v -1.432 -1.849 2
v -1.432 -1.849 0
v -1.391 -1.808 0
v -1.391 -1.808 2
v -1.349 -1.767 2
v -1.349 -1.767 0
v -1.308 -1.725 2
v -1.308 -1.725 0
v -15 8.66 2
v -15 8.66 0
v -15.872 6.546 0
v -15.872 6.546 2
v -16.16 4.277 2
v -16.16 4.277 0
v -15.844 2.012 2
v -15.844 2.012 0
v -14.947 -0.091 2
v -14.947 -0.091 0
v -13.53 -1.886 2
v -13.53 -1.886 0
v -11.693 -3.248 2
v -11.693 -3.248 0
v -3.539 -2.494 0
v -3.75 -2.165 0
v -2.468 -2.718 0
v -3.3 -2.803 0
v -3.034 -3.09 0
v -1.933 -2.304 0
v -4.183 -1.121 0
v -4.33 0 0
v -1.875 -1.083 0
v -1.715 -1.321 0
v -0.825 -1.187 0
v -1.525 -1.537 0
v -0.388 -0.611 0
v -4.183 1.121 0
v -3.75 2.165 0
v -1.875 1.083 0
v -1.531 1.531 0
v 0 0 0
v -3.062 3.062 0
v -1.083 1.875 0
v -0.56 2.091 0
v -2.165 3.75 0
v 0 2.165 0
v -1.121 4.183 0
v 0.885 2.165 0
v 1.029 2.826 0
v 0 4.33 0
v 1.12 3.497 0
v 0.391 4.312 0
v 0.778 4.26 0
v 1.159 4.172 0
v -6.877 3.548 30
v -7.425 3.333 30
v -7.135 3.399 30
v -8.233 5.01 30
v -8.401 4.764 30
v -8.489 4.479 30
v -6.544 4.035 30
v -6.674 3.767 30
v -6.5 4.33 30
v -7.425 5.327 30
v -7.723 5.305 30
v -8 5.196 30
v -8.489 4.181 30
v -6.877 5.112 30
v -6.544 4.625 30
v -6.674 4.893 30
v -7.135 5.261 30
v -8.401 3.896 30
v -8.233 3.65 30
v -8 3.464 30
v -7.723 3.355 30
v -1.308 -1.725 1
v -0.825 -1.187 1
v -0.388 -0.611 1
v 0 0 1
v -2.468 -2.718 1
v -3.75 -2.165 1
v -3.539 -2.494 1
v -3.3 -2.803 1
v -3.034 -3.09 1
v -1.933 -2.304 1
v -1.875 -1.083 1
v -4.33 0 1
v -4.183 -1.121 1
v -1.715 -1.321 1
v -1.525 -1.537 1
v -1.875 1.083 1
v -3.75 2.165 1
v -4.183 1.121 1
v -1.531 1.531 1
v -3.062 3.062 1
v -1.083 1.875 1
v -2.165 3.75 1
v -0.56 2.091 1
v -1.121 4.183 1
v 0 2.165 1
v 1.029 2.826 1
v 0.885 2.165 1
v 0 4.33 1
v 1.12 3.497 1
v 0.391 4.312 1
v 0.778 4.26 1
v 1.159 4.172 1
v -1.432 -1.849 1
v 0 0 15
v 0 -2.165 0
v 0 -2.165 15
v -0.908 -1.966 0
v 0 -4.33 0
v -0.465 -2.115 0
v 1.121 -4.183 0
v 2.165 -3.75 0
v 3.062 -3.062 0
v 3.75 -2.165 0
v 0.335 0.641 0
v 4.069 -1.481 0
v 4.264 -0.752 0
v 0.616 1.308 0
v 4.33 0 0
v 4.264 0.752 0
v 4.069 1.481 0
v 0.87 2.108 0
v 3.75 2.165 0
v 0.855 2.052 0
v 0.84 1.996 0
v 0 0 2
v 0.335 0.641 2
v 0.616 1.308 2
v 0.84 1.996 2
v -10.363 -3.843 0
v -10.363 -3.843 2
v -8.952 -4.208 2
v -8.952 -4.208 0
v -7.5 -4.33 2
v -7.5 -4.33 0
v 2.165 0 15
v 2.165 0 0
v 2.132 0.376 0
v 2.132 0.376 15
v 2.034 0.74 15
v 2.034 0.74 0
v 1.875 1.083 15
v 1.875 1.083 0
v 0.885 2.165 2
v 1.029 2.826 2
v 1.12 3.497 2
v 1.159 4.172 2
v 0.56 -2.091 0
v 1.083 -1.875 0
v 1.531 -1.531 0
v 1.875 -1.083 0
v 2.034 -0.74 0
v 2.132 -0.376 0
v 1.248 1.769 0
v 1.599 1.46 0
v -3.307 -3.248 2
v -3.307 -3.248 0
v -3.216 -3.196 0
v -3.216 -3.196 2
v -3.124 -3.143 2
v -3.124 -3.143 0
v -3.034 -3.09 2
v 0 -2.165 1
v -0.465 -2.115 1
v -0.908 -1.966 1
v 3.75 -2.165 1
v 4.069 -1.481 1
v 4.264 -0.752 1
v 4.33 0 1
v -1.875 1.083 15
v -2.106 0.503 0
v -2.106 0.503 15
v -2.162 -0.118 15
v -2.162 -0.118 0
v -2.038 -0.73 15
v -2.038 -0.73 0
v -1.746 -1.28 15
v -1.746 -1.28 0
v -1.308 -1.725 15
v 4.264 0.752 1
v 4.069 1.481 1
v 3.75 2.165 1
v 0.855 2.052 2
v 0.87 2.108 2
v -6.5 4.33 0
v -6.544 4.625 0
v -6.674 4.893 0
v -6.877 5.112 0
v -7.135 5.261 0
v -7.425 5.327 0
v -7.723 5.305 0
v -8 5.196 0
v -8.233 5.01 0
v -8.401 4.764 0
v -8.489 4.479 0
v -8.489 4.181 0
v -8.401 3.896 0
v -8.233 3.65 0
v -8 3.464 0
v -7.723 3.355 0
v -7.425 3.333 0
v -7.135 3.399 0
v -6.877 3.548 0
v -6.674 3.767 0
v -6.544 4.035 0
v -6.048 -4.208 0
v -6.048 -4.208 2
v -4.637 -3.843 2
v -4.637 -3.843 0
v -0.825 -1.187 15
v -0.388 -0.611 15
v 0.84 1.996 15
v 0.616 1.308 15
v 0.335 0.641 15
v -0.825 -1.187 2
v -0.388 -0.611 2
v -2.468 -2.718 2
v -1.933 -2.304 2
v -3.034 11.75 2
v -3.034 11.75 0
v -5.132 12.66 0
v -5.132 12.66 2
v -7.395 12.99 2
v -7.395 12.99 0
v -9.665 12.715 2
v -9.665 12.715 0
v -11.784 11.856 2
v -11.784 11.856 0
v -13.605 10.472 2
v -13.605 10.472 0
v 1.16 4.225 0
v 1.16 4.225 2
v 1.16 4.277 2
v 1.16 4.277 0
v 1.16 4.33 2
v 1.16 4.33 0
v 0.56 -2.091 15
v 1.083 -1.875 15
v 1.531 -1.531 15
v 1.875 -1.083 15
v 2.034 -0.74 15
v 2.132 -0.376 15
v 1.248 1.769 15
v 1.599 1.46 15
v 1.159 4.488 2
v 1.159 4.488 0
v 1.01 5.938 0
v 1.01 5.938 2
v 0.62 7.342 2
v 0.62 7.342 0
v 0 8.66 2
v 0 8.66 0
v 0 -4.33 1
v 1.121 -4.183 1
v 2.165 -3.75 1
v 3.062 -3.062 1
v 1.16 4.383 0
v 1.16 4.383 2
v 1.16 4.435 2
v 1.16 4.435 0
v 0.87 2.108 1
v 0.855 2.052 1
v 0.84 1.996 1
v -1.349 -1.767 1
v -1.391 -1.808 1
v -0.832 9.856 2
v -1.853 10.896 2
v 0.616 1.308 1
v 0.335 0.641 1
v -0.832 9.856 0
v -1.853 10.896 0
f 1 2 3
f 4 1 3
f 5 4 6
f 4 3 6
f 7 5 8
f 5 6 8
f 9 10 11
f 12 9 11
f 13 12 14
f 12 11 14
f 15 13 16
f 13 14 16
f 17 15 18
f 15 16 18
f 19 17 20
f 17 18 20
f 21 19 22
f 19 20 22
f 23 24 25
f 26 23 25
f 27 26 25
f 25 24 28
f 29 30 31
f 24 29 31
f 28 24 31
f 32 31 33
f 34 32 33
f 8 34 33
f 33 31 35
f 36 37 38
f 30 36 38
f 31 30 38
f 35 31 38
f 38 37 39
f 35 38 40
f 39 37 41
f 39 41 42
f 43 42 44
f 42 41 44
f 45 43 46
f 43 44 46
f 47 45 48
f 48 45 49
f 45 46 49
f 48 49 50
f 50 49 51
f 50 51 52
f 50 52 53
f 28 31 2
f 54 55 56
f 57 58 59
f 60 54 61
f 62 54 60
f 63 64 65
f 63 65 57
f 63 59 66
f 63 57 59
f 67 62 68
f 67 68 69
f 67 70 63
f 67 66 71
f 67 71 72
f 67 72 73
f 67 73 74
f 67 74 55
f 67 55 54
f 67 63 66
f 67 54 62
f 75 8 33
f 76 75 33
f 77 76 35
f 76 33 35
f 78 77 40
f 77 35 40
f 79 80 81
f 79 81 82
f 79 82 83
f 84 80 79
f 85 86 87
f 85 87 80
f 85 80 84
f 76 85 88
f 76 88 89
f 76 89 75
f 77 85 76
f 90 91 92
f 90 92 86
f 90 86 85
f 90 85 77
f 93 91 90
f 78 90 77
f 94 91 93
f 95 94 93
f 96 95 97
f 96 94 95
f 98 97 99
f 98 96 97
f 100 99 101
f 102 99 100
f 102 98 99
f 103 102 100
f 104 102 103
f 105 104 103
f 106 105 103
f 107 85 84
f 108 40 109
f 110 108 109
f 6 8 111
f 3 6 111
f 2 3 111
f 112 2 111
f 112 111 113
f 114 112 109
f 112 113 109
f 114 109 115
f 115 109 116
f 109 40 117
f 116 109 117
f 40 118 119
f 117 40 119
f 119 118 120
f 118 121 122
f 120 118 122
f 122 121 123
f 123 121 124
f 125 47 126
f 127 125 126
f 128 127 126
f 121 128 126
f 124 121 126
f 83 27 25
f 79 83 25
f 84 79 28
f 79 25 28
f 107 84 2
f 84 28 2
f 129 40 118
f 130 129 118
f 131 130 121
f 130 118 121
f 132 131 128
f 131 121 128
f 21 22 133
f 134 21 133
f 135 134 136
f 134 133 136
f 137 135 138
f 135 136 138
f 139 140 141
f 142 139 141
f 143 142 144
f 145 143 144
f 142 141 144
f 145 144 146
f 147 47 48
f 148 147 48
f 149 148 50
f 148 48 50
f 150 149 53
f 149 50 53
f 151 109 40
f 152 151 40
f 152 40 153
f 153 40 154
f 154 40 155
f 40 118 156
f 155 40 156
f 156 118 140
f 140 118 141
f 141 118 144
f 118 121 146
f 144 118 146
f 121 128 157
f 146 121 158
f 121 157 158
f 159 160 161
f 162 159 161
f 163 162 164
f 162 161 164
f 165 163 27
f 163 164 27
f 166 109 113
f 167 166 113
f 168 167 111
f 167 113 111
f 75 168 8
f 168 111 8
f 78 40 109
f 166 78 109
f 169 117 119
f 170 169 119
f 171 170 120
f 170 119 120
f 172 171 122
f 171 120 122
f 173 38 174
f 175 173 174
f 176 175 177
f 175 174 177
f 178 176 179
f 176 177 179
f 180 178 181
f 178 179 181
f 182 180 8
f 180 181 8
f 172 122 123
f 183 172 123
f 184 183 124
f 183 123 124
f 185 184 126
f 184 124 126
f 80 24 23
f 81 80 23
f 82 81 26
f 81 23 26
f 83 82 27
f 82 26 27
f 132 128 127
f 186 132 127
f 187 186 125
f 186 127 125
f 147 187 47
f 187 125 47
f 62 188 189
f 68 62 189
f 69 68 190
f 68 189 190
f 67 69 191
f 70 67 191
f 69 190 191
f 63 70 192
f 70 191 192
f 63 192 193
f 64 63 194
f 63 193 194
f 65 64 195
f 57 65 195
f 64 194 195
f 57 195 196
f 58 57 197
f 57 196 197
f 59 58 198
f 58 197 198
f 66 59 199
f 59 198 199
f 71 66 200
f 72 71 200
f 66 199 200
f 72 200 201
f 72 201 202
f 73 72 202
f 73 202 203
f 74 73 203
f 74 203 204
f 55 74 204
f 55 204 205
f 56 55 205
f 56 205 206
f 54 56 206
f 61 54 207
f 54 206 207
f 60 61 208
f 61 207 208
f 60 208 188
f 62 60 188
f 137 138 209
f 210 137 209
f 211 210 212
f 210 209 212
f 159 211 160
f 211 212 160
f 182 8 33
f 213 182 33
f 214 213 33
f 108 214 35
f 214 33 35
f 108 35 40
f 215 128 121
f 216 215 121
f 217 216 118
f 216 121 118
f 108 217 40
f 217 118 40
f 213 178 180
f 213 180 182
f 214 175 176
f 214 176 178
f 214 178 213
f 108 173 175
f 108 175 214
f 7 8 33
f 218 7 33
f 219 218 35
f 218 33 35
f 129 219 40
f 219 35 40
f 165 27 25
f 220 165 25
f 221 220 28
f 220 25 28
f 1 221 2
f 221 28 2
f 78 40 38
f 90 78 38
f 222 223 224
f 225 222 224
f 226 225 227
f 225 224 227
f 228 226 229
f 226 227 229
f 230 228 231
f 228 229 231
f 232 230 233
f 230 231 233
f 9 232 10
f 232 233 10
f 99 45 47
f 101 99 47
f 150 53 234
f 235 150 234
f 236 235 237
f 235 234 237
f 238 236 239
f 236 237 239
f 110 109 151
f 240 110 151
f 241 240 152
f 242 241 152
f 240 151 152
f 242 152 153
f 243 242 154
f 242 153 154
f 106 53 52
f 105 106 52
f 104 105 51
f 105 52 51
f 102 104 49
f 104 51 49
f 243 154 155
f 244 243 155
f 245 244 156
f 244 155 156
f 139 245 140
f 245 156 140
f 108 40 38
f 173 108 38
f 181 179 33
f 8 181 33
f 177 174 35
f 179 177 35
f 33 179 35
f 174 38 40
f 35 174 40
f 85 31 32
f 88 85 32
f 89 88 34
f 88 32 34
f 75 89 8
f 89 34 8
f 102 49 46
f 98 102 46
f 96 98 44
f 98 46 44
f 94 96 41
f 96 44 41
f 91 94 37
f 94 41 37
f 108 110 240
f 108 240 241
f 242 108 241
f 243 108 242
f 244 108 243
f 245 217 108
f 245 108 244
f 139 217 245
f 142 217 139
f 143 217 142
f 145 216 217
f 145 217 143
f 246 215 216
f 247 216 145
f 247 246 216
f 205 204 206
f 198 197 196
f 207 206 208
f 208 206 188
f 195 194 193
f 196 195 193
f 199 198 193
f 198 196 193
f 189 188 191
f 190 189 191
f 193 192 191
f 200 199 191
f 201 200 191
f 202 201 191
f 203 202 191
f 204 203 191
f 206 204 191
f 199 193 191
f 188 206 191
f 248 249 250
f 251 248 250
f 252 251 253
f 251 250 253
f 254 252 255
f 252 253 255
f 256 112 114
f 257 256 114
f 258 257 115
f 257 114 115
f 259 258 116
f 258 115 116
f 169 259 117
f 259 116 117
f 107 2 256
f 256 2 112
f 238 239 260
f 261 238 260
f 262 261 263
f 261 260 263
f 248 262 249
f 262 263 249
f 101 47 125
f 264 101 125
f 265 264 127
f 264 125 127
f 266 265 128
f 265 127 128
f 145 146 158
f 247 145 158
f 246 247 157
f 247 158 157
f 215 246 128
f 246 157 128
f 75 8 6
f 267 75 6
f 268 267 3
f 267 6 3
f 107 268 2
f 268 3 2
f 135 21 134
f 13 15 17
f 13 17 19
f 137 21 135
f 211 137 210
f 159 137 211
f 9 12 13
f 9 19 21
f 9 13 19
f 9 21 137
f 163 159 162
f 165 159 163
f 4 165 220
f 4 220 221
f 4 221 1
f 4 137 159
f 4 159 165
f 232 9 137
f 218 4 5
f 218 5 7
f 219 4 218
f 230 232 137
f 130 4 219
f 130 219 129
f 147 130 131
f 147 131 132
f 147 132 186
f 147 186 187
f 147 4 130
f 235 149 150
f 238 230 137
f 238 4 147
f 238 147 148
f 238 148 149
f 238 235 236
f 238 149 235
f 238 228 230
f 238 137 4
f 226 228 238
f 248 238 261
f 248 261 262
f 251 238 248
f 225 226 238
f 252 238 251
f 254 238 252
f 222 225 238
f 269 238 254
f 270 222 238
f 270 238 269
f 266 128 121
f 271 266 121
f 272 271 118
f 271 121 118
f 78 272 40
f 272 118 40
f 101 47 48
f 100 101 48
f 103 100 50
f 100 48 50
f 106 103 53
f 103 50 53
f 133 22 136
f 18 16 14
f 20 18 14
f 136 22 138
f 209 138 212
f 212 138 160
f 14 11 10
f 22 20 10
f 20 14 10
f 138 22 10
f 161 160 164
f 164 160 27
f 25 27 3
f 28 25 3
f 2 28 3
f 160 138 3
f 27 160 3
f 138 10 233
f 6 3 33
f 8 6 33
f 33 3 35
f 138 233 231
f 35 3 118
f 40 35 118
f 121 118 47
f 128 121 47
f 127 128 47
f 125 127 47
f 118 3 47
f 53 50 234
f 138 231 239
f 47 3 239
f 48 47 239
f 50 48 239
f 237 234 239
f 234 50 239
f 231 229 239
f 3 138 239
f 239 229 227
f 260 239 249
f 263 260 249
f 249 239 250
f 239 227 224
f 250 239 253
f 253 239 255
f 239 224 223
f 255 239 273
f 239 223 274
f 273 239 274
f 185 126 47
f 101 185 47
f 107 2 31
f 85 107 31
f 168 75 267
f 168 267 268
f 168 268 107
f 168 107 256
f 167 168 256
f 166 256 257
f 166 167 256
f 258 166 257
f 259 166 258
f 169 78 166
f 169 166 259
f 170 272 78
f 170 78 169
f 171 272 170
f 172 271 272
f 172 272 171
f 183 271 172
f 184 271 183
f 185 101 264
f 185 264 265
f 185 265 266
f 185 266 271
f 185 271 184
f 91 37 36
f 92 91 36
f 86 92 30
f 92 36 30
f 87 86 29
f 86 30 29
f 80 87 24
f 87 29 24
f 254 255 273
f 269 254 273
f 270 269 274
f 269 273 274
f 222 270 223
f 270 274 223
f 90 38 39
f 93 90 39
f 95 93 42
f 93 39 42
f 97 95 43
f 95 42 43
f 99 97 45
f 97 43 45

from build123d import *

# Parameters (mm, degrees)
F1_DEPTH = 15
F2_DEPTH = 1
F0_R     = 1
F3_DEPTH = 2
F4_DEPTH = 30


with BuildPart() as f1:
    # F0 (on Top) → F1 (new body)
    with BuildSketch(Plane.XY):
        with BuildLine():
            ThreePointArc((0.8396661785, 1.9956103599), (0.4824414397, 0.9714623049), (0, 0))
            Line((0, 0), (1.875, 1.0825317547))
            ThreePointArc((1.875, 1.0825317547), (1.4320549047, 1.6237976321), (0.8396661785, 1.9956103599))
        make_face()
        with BuildLine():
            Line((0, 0), (0, -2.1650635095))
            ThreePointArc((0, -2.1650635095), (1.0825317923, -1.8749999783), (1.8750000434, -1.0825316796))
            ThreePointArc((1.8750000434, -1.0825316796), (2.0912907706, -0.5603596282), (2.1650635095, 0))
            ThreePointArc((2.1650635095, 0), (2.0912907593, 0.5603596701), (1.875, 1.0825317547))
            Line((1.875, 1.0825317547), (0, 0))
        make_face()
    extrude(amount=F1_DEPTH)


with BuildPart() as f1b:
    # F0 (on Top) → F1, piece 2 (new body)
    with BuildSketch(Plane.XY):
        with BuildLine():
            Line((0, 0), (-1.875, 1.0825317547))
            ThreePointArc((-1.875, 1.0825317547), (-2.1650635095, 4.52e-08), (-1.8750000452, -1.0825316765))
            ThreePointArc((-1.8750000452, -1.0825316765), (-1.623797662, -1.4320548708), (-1.3084161785, -1.7249774213))
            ThreePointArc((-1.3084161785, -1.7249774213), (-0.600090315, -0.9035376951), (0, 0))
        make_face()
    extrude(amount=F1_DEPTH)


with BuildPart() as f2:
    # F0 (on Top) → F2 (new body)
    with BuildSketch(Plane.XY):
        with BuildLine():
            Line((-1.8750000452, -1.0825316765), (-3.75, 2.1650635095))
            ThreePointArc((-3.75, 2.1650635095), (-4.3301270189, -7.9e-09), (-3.7499999921, -2.1650635231))
            ThreePointArc((-3.7499999921, -2.1650635231), (-3.4232659796, -2.6516504357), (-3.0338137289, -3.0896560097))
            ThreePointArc((-3.0338137289, -3.0896560097), (-2.1966991411, -2.5164049499), (-1.4323725422, -1.8491850005))
            Line((-1.4323725422, -1.8491850005), (-1.8750000452, -1.0825316765))
        make_face()
        with BuildLine():
            Line((-1.875, 1.0825317547), (-3.75, 2.1650635095))
            Line((-3.75, 2.1650635095), (-1.8750000452, -1.0825316765))
            ThreePointArc((-1.8750000452, -1.0825316765), (-2.1650635095, 4.52e-08), (-1.875, 1.0825317547))
        make_face()
        with BuildLine():
            Line((0, 2.1650635095), (-3.75, 2.1650635095))
            Line((-3.75, 2.1650635095), (-1.875, 1.0825317547))
            ThreePointArc((-1.875, 1.0825317547), (-1.0825317547, 1.875), (0, 2.1650635095))
        make_face()
        with BuildLine():
            ThreePointArc((4.5e-08, 4.3301270189), (-2.16506349, 3.7500000112), (-3.75, 2.1650635095))
            Line((-3.75, 2.1650635095), (0, 2.1650635095))
            Line((0, 2.1650635095), (0.8852549156, 2.1650635095))
            ThreePointArc((0.8852549156, 2.1650635095), (1.0809210423, 3.1605997356), (1.1588137289, 4.1721877644))
            ThreePointArc((1.1588137289, 4.1721877644), (0.5847636639, 4.2904605181), (4.5e-08, 4.3301270189))
        make_face()
        with BuildLine():
            Line((0, 0), (-1.875, 1.0825317547))
            ThreePointArc((-1.875, 1.0825317547), (-2.1650635095, 4.52e-08), (-1.8750000452, -1.0825316765))
            ThreePointArc((-1.8750000452, -1.0825316765), (-1.623797662, -1.4320548708), (-1.3084161785, -1.7249774213))
            ThreePointArc((-1.3084161785, -1.7249774213), (-0.600090315, -0.9035376951), (0, 0))
        make_face()
    extrude(amount=F2_DEPTH)


with BuildPart() as f2b:
    # F0 (on Top) → F2, piece 2 (new body)
    with BuildSketch(Plane.XY):
        with BuildLine():
            Line((1.875, 1.0825317547), (3.75, 2.1650635095))
            Line((3.75, 2.1650635095), (0.8852549156, 2.1650635095))
            ThreePointArc((0.8852549156, 2.1650635095), (0.8628897514, 2.0802214639), (0.8396661785, 1.9956103599))
            ThreePointArc((0.8396661785, 1.9956103599), (1.4320549047, 1.6237976321), (1.875, 1.0825317547))
        make_face()
        with BuildLine():
            ThreePointArc((2.1650635095, 0), (2.0912907706, -0.5603596282), (1.8750000434, -1.0825316796))
            Line((1.8750000434, -1.0825316796), (3.75, 2.1650635095))
            Line((3.75, 2.1650635095), (1.875, 1.0825317547))
            ThreePointArc((1.875, 1.0825317547), (2.0912907593, 0.5603596701), (2.1650635095, 0))
        make_face()
        with BuildLine():
            Line((1.8750000434, -1.0825316796), (0, -4.3301270189))
            ThreePointArc((0, -4.3301270189), (2.1650634514, -3.7500000335), (3.7499999329, -2.1650636256))
            ThreePointArc((3.7499999329, -2.1650636256), (4.1825815013, -1.120719405), (4.3301270189, 0))
            ThreePointArc((4.3301270189, 0), (4.1825815187, 1.1207193402), (3.75, 2.1650635095))
            Line((3.75, 2.1650635095), (1.8750000434, -1.0825316796))
        make_face()
        with BuildLine():
            Line((0, -2.1650635095), (0, -4.3301270189))
            Line((0, -4.3301270189), (1.8750000434, -1.0825316796))
            ThreePointArc((1.8750000434, -1.0825316796), (1.0825317923, -1.8749999783), (0, -2.1650635095))
        make_face()
        with BuildLine():
            Line((-1.4323725422, -1.8491850005), (0, -4.3301270189))
            Line((0, -4.3301270189), (0, -2.1650635095))
            ThreePointArc((0, -2.1650635095), (-0.6902225477, -2.0520947431), (-1.3084161785, -1.7249774213))
            ThreePointArc((-1.3084161785, -1.7249774213), (-1.3700797576, -1.7873951773), (-1.4323725422, -1.8491850005))
        make_face()
        with BuildLine():
            Line((0, 0), (0, -2.1650635095))
            ThreePointArc((0, -2.1650635095), (1.0825317923, -1.8749999783), (1.8750000434, -1.0825316796))
            ThreePointArc((1.8750000434, -1.0825316796), (2.0912907706, -0.5603596282), (2.1650635095, 0))
            ThreePointArc((2.1650635095, 0), (2.0912907593, 0.5603596701), (1.875, 1.0825317547))
            Line((1.875, 1.0825317547), (0, 0))
        make_face()
        with BuildLine():
            ThreePointArc((0.8396661785, 1.9956103599), (0.4824414397, 0.9714623049), (0, 0))
            Line((0, 0), (1.875, 1.0825317547))
            ThreePointArc((1.875, 1.0825317547), (1.4320549047, 1.6237976321), (0.8396661785, 1.9956103599))
        make_face()
    extrude(amount=F2_DEPTH)


with BuildPart() as f3:
    # F0 (on Top) → F3 (new body)
    with BuildSketch(Plane.XY):
        with BuildLine():
            ThreePointArc((-11.6926274578, -3.2475952642), (-10.9473040653, -1.7098036264), (-9.6650635095, -0.5801270189))
            Line((-9.6650635095, -0.5801270189), (-15, 8.6602540378))
            ThreePointArc((-15, 8.6602540378), (-15.8443755289, 2.0124995611), (-11.6926274578, -3.2475952642))
        make_face()
        with BuildLine():
            ThreePointArc((-9.6650635095, -0.5801270189), (-7.5, 0), (-5.3349364905, -0.5801270189))
            Line((-5.3349364905, -0.5801270189), (-3.75, 2.1650635095))
            Line((-3.75, 2.1650635095), (-2.1650635095, 4.9102540378))
            ThreePointArc((-2.1650635095, 4.9102540378), (-3.75, 6.4951905284), (-4.3301270189, 8.6602540378))
            Line((-4.3301270189, 8.6602540378), (-15, 8.6602540378))
            Line((-15, 8.6602540378), (-9.6650635095, -0.5801270189))
        make_face()
        with Locations((-7.5, 4.3301270189)):
            Circle(F0_R, mode=Mode.SUBTRACT)
        with BuildLine():
            ThreePointArc((-3.0338137289, 11.7499100475), (-9.6650635095, 12.7153819345), (-15, 8.6602540378))
            Line((-15, 8.6602540378), (-4.3301270189, 8.6602540378))
            ThreePointArc((-4.3301270189, 8.6602540378), (-3.9929186567, 10.3355452367), (-3.0338137289, 11.7499100475))
        make_face()
        with BuildLine():
            ThreePointArc((-3.0338137289, 11.7499100475), (-3.9929186567, 10.3355452367), (-4.3301270189, 8.6602540378))
            Line((-4.3301270189, 8.6602540378), (0, 8.6602540378))
            ThreePointArc((0, 8.6602540378), (-1.3206879806, 10.3977544767), (-3.0338137289, 11.7499100475))
        make_face()
        with BuildLine():
            ThreePointArc((-4.3301270189, 8.6602540378), (-3.75, 6.4951905284), (-2.1650635095, 4.9102540378))
            Line((-2.1650635095, 4.9102540378), (0, 8.6602540378))
            Line((0, 8.6602540378), (-4.3301270189, 8.6602540378))
        make_face()
        with BuildLine():
            Line((0, 8.6602540378), (-2.1650635095, 4.9102540378))
            ThreePointArc((-2.1650635095, 4.9102540378), (-1.1207193185, 4.4776725133), (4.5e-08, 4.3301270189))
            ThreePointArc((4.5e-08, 4.3301270189), (0.5847636639, 4.3697935197), (1.1588137289, 4.4880662734))
            ThreePointArc((1.1588137289, 4.4880662734), (0.8443755289, 6.6477544767), (0, 8.6602540378))
        make_face()
        with BuildLine():
            Line((-2.1650635095, 4.9102540378), (-3.75, 2.1650635095))
            ThreePointArc((-3.75, 2.1650635095), (-2.16506349, 3.7500000112), (4.5e-08, 4.3301270189))
            ThreePointArc((4.5e-08, 4.3301270189), (-1.1207193185, 4.4776725133), (-2.1650635095, 4.9102540378))
        make_face()
        with BuildLine():
            ThreePointArc((4.5e-08, 4.3301270189), (-2.16506349, 3.7500000112), (-3.75, 2.1650635095))
            Line((-3.75, 2.1650635095), (0, 2.1650635095))
            Line((0, 2.1650635095), (0.8852549156, 2.1650635095))
            ThreePointArc((0.8852549156, 2.1650635095), (1.0809210423, 3.1605997356), (1.1588137289, 4.1721877644))
            ThreePointArc((1.1588137289, 4.1721877644), (0.5847636639, 4.2904605181), (4.5e-08, 4.3301270189))
        make_face()
        with BuildLine():
            Line((0, 2.1650635095), (-3.75, 2.1650635095))
            Line((-3.75, 2.1650635095), (-1.875, 1.0825317547))
            ThreePointArc((-1.875, 1.0825317547), (-1.0825317547, 1.875), (0, 2.1650635095))
        make_face()
        with BuildLine():
            Line((-1.875, 1.0825317547), (-3.75, 2.1650635095))
            Line((-3.75, 2.1650635095), (-1.8750000452, -1.0825316765))
            ThreePointArc((-1.8750000452, -1.0825316765), (-2.1650635095, 4.52e-08), (-1.875, 1.0825317547))
        make_face()
        with BuildLine():
            Line((-3.75, 2.1650635095), (-5.3349364905, -0.5801270189))
            ThreePointArc((-5.3349364905, -0.5801270189), (-4.4381378159, -1.268264846), (-3.7499999921, -2.1650635231))
            ThreePointArc((-3.7499999921, -2.1650635231), (-4.3301270189, -7.9e-09), (-3.75, 2.1650635095))
        make_face()
        with BuildLine():
            Line((-1.8750000452, -1.0825316765), (-3.75, 2.1650635095))
            ThreePointArc((-3.75, 2.1650635095), (-4.3301270189, -7.9e-09), (-3.7499999921, -2.1650635231))
            ThreePointArc((-3.7499999921, -2.1650635231), (-3.4232659796, -2.6516504357), (-3.0338137289, -3.0896560097))
            ThreePointArc((-3.0338137289, -3.0896560097), (-2.1966991411, -2.5164049499), (-1.4323725422, -1.8491850005))
            Line((-1.4323725422, -1.8491850005), (-1.8750000452, -1.0825316765))
        make_face()
        with BuildLine():
            Line((-5.3349364905, -0.5801270189), (-7.5, -4.3301270189))
            ThreePointArc((-7.5, -4.3301270189), (-5.3349364905, -4.0551278967), (-3.3073725422, -3.2475952642))
            ThreePointArc((-3.3073725422, -3.2475952642), (-3.491970371, -2.6913169345), (-3.7499999921, -2.1650635231))
            ThreePointArc((-3.7499999921, -2.1650635231), (-4.4381378159, -1.268264846), (-5.3349364905, -0.5801270189))
        make_face()
        with BuildLine():
            Line((-9.6650635095, -0.5801270189), (-7.5, -4.3301270189))
            Line((-7.5, -4.3301270189), (-5.3349364905, -0.5801270189))
            ThreePointArc((-5.3349364905, -0.5801270189), (-7.5, 0), (-9.6650635095, -0.5801270189))
        make_face()
        with BuildLine():
            ThreePointArc((-11.6926274578, -3.2475952642), (-9.6650635095, -4.0551278967), (-7.5, -4.3301270189))
            Line((-7.5, -4.3301270189), (-9.6650635095, -0.5801270189))
            ThreePointArc((-9.6650635095, -0.5801270189), (-10.9473040653, -1.7098036264), (-11.6926274578, -3.2475952642))
        make_face()
        with BuildLine():
            ThreePointArc((1.1588137289, 4.4880662734), (0.5847636639, 4.3697935197), (4.5e-08, 4.3301270189))
            ThreePointArc((4.5e-08, 4.3301270189), (0.5847636639, 4.2904605181), (1.1588137289, 4.1721877644))
            ThreePointArc((1.1588137289, 4.1721877644), (1.1598939531, 4.2511541081), (1.1602540378, 4.3301270189))
            ThreePointArc((1.1602540378, 4.3301270189), (1.1598939531, 4.4090999298), (1.1588137289, 4.4880662734))
        make_face()
        with BuildLine():
            ThreePointArc((0, 2.1650635095), (-1.0825317547, 1.875), (-1.875, 1.0825317547))
            Line((-1.875, 1.0825317547), (0, 0))
            ThreePointArc((0, 0), (0.4824414397, 0.9714623049), (0.8396661785, 1.9956103599))
            ThreePointArc((0.8396661785, 1.9956103599), (0.428297111, 2.1222774523), (0, 2.1650635095))
        make_face()
        with BuildLine():
            Line((0.8852549156, 2.1650635095), (0, 2.1650635095))
            ThreePointArc((0, 2.1650635095), (0.428297111, 2.1222774523), (0.8396661785, 1.9956103599))
            ThreePointArc((0.8396661785, 1.9956103599), (0.8628897514, 2.0802214639), (0.8852549156, 2.1650635095))
        make_face()
        with BuildLine():
            Line((0, 0), (-1.875, 1.0825317547))
            ThreePointArc((-1.875, 1.0825317547), (-2.1650635095, 4.52e-08), (-1.8750000452, -1.0825316765))
            ThreePointArc((-1.8750000452, -1.0825316765), (-1.623797662, -1.4320548708), (-1.3084161785, -1.7249774213))
            ThreePointArc((-1.3084161785, -1.7249774213), (-0.600090315, -0.9035376951), (0, 0))
        make_face()
        with BuildLine():
            ThreePointArc((-3.7499999921, -2.1650635231), (-3.491970371, -2.6913169345), (-3.3073725422, -3.2475952642))
            ThreePointArc((-3.3073725422, -3.2475952642), (-3.1698729811, -3.1698729811), (-3.0338137289, -3.0896560097))
            ThreePointArc((-3.0338137289, -3.0896560097), (-3.4232659796, -2.6516504357), (-3.7499999921, -2.1650635231))
        make_face()
        with BuildLine():
            Line((-1.8750000452, -1.0825316765), (-1.4323725422, -1.8491850005))
            ThreePointArc((-1.4323725422, -1.8491850005), (-1.3700797576, -1.7873951773), (-1.3084161785, -1.7249774213))
            ThreePointArc((-1.3084161785, -1.7249774213), (-1.623797662, -1.4320548708), (-1.8750000452, -1.0825316765))
        make_face()
        with Locations((-7.5, 4.3301270189)):
            Circle(F0_R)
    extrude(amount=F3_DEPTH)


with BuildPart() as f4:
    # F0 (on Top) → F4 (new body)
    with BuildSketch(Plane.XY):
        with Locations((-7.5, 4.3301270189)):
            Circle(F0_R)
    extrude(amount=F4_DEPTH)


solid = Compound([f1.part, f1b.part, f2.part, f2b.part, f3.part, f4.part])
